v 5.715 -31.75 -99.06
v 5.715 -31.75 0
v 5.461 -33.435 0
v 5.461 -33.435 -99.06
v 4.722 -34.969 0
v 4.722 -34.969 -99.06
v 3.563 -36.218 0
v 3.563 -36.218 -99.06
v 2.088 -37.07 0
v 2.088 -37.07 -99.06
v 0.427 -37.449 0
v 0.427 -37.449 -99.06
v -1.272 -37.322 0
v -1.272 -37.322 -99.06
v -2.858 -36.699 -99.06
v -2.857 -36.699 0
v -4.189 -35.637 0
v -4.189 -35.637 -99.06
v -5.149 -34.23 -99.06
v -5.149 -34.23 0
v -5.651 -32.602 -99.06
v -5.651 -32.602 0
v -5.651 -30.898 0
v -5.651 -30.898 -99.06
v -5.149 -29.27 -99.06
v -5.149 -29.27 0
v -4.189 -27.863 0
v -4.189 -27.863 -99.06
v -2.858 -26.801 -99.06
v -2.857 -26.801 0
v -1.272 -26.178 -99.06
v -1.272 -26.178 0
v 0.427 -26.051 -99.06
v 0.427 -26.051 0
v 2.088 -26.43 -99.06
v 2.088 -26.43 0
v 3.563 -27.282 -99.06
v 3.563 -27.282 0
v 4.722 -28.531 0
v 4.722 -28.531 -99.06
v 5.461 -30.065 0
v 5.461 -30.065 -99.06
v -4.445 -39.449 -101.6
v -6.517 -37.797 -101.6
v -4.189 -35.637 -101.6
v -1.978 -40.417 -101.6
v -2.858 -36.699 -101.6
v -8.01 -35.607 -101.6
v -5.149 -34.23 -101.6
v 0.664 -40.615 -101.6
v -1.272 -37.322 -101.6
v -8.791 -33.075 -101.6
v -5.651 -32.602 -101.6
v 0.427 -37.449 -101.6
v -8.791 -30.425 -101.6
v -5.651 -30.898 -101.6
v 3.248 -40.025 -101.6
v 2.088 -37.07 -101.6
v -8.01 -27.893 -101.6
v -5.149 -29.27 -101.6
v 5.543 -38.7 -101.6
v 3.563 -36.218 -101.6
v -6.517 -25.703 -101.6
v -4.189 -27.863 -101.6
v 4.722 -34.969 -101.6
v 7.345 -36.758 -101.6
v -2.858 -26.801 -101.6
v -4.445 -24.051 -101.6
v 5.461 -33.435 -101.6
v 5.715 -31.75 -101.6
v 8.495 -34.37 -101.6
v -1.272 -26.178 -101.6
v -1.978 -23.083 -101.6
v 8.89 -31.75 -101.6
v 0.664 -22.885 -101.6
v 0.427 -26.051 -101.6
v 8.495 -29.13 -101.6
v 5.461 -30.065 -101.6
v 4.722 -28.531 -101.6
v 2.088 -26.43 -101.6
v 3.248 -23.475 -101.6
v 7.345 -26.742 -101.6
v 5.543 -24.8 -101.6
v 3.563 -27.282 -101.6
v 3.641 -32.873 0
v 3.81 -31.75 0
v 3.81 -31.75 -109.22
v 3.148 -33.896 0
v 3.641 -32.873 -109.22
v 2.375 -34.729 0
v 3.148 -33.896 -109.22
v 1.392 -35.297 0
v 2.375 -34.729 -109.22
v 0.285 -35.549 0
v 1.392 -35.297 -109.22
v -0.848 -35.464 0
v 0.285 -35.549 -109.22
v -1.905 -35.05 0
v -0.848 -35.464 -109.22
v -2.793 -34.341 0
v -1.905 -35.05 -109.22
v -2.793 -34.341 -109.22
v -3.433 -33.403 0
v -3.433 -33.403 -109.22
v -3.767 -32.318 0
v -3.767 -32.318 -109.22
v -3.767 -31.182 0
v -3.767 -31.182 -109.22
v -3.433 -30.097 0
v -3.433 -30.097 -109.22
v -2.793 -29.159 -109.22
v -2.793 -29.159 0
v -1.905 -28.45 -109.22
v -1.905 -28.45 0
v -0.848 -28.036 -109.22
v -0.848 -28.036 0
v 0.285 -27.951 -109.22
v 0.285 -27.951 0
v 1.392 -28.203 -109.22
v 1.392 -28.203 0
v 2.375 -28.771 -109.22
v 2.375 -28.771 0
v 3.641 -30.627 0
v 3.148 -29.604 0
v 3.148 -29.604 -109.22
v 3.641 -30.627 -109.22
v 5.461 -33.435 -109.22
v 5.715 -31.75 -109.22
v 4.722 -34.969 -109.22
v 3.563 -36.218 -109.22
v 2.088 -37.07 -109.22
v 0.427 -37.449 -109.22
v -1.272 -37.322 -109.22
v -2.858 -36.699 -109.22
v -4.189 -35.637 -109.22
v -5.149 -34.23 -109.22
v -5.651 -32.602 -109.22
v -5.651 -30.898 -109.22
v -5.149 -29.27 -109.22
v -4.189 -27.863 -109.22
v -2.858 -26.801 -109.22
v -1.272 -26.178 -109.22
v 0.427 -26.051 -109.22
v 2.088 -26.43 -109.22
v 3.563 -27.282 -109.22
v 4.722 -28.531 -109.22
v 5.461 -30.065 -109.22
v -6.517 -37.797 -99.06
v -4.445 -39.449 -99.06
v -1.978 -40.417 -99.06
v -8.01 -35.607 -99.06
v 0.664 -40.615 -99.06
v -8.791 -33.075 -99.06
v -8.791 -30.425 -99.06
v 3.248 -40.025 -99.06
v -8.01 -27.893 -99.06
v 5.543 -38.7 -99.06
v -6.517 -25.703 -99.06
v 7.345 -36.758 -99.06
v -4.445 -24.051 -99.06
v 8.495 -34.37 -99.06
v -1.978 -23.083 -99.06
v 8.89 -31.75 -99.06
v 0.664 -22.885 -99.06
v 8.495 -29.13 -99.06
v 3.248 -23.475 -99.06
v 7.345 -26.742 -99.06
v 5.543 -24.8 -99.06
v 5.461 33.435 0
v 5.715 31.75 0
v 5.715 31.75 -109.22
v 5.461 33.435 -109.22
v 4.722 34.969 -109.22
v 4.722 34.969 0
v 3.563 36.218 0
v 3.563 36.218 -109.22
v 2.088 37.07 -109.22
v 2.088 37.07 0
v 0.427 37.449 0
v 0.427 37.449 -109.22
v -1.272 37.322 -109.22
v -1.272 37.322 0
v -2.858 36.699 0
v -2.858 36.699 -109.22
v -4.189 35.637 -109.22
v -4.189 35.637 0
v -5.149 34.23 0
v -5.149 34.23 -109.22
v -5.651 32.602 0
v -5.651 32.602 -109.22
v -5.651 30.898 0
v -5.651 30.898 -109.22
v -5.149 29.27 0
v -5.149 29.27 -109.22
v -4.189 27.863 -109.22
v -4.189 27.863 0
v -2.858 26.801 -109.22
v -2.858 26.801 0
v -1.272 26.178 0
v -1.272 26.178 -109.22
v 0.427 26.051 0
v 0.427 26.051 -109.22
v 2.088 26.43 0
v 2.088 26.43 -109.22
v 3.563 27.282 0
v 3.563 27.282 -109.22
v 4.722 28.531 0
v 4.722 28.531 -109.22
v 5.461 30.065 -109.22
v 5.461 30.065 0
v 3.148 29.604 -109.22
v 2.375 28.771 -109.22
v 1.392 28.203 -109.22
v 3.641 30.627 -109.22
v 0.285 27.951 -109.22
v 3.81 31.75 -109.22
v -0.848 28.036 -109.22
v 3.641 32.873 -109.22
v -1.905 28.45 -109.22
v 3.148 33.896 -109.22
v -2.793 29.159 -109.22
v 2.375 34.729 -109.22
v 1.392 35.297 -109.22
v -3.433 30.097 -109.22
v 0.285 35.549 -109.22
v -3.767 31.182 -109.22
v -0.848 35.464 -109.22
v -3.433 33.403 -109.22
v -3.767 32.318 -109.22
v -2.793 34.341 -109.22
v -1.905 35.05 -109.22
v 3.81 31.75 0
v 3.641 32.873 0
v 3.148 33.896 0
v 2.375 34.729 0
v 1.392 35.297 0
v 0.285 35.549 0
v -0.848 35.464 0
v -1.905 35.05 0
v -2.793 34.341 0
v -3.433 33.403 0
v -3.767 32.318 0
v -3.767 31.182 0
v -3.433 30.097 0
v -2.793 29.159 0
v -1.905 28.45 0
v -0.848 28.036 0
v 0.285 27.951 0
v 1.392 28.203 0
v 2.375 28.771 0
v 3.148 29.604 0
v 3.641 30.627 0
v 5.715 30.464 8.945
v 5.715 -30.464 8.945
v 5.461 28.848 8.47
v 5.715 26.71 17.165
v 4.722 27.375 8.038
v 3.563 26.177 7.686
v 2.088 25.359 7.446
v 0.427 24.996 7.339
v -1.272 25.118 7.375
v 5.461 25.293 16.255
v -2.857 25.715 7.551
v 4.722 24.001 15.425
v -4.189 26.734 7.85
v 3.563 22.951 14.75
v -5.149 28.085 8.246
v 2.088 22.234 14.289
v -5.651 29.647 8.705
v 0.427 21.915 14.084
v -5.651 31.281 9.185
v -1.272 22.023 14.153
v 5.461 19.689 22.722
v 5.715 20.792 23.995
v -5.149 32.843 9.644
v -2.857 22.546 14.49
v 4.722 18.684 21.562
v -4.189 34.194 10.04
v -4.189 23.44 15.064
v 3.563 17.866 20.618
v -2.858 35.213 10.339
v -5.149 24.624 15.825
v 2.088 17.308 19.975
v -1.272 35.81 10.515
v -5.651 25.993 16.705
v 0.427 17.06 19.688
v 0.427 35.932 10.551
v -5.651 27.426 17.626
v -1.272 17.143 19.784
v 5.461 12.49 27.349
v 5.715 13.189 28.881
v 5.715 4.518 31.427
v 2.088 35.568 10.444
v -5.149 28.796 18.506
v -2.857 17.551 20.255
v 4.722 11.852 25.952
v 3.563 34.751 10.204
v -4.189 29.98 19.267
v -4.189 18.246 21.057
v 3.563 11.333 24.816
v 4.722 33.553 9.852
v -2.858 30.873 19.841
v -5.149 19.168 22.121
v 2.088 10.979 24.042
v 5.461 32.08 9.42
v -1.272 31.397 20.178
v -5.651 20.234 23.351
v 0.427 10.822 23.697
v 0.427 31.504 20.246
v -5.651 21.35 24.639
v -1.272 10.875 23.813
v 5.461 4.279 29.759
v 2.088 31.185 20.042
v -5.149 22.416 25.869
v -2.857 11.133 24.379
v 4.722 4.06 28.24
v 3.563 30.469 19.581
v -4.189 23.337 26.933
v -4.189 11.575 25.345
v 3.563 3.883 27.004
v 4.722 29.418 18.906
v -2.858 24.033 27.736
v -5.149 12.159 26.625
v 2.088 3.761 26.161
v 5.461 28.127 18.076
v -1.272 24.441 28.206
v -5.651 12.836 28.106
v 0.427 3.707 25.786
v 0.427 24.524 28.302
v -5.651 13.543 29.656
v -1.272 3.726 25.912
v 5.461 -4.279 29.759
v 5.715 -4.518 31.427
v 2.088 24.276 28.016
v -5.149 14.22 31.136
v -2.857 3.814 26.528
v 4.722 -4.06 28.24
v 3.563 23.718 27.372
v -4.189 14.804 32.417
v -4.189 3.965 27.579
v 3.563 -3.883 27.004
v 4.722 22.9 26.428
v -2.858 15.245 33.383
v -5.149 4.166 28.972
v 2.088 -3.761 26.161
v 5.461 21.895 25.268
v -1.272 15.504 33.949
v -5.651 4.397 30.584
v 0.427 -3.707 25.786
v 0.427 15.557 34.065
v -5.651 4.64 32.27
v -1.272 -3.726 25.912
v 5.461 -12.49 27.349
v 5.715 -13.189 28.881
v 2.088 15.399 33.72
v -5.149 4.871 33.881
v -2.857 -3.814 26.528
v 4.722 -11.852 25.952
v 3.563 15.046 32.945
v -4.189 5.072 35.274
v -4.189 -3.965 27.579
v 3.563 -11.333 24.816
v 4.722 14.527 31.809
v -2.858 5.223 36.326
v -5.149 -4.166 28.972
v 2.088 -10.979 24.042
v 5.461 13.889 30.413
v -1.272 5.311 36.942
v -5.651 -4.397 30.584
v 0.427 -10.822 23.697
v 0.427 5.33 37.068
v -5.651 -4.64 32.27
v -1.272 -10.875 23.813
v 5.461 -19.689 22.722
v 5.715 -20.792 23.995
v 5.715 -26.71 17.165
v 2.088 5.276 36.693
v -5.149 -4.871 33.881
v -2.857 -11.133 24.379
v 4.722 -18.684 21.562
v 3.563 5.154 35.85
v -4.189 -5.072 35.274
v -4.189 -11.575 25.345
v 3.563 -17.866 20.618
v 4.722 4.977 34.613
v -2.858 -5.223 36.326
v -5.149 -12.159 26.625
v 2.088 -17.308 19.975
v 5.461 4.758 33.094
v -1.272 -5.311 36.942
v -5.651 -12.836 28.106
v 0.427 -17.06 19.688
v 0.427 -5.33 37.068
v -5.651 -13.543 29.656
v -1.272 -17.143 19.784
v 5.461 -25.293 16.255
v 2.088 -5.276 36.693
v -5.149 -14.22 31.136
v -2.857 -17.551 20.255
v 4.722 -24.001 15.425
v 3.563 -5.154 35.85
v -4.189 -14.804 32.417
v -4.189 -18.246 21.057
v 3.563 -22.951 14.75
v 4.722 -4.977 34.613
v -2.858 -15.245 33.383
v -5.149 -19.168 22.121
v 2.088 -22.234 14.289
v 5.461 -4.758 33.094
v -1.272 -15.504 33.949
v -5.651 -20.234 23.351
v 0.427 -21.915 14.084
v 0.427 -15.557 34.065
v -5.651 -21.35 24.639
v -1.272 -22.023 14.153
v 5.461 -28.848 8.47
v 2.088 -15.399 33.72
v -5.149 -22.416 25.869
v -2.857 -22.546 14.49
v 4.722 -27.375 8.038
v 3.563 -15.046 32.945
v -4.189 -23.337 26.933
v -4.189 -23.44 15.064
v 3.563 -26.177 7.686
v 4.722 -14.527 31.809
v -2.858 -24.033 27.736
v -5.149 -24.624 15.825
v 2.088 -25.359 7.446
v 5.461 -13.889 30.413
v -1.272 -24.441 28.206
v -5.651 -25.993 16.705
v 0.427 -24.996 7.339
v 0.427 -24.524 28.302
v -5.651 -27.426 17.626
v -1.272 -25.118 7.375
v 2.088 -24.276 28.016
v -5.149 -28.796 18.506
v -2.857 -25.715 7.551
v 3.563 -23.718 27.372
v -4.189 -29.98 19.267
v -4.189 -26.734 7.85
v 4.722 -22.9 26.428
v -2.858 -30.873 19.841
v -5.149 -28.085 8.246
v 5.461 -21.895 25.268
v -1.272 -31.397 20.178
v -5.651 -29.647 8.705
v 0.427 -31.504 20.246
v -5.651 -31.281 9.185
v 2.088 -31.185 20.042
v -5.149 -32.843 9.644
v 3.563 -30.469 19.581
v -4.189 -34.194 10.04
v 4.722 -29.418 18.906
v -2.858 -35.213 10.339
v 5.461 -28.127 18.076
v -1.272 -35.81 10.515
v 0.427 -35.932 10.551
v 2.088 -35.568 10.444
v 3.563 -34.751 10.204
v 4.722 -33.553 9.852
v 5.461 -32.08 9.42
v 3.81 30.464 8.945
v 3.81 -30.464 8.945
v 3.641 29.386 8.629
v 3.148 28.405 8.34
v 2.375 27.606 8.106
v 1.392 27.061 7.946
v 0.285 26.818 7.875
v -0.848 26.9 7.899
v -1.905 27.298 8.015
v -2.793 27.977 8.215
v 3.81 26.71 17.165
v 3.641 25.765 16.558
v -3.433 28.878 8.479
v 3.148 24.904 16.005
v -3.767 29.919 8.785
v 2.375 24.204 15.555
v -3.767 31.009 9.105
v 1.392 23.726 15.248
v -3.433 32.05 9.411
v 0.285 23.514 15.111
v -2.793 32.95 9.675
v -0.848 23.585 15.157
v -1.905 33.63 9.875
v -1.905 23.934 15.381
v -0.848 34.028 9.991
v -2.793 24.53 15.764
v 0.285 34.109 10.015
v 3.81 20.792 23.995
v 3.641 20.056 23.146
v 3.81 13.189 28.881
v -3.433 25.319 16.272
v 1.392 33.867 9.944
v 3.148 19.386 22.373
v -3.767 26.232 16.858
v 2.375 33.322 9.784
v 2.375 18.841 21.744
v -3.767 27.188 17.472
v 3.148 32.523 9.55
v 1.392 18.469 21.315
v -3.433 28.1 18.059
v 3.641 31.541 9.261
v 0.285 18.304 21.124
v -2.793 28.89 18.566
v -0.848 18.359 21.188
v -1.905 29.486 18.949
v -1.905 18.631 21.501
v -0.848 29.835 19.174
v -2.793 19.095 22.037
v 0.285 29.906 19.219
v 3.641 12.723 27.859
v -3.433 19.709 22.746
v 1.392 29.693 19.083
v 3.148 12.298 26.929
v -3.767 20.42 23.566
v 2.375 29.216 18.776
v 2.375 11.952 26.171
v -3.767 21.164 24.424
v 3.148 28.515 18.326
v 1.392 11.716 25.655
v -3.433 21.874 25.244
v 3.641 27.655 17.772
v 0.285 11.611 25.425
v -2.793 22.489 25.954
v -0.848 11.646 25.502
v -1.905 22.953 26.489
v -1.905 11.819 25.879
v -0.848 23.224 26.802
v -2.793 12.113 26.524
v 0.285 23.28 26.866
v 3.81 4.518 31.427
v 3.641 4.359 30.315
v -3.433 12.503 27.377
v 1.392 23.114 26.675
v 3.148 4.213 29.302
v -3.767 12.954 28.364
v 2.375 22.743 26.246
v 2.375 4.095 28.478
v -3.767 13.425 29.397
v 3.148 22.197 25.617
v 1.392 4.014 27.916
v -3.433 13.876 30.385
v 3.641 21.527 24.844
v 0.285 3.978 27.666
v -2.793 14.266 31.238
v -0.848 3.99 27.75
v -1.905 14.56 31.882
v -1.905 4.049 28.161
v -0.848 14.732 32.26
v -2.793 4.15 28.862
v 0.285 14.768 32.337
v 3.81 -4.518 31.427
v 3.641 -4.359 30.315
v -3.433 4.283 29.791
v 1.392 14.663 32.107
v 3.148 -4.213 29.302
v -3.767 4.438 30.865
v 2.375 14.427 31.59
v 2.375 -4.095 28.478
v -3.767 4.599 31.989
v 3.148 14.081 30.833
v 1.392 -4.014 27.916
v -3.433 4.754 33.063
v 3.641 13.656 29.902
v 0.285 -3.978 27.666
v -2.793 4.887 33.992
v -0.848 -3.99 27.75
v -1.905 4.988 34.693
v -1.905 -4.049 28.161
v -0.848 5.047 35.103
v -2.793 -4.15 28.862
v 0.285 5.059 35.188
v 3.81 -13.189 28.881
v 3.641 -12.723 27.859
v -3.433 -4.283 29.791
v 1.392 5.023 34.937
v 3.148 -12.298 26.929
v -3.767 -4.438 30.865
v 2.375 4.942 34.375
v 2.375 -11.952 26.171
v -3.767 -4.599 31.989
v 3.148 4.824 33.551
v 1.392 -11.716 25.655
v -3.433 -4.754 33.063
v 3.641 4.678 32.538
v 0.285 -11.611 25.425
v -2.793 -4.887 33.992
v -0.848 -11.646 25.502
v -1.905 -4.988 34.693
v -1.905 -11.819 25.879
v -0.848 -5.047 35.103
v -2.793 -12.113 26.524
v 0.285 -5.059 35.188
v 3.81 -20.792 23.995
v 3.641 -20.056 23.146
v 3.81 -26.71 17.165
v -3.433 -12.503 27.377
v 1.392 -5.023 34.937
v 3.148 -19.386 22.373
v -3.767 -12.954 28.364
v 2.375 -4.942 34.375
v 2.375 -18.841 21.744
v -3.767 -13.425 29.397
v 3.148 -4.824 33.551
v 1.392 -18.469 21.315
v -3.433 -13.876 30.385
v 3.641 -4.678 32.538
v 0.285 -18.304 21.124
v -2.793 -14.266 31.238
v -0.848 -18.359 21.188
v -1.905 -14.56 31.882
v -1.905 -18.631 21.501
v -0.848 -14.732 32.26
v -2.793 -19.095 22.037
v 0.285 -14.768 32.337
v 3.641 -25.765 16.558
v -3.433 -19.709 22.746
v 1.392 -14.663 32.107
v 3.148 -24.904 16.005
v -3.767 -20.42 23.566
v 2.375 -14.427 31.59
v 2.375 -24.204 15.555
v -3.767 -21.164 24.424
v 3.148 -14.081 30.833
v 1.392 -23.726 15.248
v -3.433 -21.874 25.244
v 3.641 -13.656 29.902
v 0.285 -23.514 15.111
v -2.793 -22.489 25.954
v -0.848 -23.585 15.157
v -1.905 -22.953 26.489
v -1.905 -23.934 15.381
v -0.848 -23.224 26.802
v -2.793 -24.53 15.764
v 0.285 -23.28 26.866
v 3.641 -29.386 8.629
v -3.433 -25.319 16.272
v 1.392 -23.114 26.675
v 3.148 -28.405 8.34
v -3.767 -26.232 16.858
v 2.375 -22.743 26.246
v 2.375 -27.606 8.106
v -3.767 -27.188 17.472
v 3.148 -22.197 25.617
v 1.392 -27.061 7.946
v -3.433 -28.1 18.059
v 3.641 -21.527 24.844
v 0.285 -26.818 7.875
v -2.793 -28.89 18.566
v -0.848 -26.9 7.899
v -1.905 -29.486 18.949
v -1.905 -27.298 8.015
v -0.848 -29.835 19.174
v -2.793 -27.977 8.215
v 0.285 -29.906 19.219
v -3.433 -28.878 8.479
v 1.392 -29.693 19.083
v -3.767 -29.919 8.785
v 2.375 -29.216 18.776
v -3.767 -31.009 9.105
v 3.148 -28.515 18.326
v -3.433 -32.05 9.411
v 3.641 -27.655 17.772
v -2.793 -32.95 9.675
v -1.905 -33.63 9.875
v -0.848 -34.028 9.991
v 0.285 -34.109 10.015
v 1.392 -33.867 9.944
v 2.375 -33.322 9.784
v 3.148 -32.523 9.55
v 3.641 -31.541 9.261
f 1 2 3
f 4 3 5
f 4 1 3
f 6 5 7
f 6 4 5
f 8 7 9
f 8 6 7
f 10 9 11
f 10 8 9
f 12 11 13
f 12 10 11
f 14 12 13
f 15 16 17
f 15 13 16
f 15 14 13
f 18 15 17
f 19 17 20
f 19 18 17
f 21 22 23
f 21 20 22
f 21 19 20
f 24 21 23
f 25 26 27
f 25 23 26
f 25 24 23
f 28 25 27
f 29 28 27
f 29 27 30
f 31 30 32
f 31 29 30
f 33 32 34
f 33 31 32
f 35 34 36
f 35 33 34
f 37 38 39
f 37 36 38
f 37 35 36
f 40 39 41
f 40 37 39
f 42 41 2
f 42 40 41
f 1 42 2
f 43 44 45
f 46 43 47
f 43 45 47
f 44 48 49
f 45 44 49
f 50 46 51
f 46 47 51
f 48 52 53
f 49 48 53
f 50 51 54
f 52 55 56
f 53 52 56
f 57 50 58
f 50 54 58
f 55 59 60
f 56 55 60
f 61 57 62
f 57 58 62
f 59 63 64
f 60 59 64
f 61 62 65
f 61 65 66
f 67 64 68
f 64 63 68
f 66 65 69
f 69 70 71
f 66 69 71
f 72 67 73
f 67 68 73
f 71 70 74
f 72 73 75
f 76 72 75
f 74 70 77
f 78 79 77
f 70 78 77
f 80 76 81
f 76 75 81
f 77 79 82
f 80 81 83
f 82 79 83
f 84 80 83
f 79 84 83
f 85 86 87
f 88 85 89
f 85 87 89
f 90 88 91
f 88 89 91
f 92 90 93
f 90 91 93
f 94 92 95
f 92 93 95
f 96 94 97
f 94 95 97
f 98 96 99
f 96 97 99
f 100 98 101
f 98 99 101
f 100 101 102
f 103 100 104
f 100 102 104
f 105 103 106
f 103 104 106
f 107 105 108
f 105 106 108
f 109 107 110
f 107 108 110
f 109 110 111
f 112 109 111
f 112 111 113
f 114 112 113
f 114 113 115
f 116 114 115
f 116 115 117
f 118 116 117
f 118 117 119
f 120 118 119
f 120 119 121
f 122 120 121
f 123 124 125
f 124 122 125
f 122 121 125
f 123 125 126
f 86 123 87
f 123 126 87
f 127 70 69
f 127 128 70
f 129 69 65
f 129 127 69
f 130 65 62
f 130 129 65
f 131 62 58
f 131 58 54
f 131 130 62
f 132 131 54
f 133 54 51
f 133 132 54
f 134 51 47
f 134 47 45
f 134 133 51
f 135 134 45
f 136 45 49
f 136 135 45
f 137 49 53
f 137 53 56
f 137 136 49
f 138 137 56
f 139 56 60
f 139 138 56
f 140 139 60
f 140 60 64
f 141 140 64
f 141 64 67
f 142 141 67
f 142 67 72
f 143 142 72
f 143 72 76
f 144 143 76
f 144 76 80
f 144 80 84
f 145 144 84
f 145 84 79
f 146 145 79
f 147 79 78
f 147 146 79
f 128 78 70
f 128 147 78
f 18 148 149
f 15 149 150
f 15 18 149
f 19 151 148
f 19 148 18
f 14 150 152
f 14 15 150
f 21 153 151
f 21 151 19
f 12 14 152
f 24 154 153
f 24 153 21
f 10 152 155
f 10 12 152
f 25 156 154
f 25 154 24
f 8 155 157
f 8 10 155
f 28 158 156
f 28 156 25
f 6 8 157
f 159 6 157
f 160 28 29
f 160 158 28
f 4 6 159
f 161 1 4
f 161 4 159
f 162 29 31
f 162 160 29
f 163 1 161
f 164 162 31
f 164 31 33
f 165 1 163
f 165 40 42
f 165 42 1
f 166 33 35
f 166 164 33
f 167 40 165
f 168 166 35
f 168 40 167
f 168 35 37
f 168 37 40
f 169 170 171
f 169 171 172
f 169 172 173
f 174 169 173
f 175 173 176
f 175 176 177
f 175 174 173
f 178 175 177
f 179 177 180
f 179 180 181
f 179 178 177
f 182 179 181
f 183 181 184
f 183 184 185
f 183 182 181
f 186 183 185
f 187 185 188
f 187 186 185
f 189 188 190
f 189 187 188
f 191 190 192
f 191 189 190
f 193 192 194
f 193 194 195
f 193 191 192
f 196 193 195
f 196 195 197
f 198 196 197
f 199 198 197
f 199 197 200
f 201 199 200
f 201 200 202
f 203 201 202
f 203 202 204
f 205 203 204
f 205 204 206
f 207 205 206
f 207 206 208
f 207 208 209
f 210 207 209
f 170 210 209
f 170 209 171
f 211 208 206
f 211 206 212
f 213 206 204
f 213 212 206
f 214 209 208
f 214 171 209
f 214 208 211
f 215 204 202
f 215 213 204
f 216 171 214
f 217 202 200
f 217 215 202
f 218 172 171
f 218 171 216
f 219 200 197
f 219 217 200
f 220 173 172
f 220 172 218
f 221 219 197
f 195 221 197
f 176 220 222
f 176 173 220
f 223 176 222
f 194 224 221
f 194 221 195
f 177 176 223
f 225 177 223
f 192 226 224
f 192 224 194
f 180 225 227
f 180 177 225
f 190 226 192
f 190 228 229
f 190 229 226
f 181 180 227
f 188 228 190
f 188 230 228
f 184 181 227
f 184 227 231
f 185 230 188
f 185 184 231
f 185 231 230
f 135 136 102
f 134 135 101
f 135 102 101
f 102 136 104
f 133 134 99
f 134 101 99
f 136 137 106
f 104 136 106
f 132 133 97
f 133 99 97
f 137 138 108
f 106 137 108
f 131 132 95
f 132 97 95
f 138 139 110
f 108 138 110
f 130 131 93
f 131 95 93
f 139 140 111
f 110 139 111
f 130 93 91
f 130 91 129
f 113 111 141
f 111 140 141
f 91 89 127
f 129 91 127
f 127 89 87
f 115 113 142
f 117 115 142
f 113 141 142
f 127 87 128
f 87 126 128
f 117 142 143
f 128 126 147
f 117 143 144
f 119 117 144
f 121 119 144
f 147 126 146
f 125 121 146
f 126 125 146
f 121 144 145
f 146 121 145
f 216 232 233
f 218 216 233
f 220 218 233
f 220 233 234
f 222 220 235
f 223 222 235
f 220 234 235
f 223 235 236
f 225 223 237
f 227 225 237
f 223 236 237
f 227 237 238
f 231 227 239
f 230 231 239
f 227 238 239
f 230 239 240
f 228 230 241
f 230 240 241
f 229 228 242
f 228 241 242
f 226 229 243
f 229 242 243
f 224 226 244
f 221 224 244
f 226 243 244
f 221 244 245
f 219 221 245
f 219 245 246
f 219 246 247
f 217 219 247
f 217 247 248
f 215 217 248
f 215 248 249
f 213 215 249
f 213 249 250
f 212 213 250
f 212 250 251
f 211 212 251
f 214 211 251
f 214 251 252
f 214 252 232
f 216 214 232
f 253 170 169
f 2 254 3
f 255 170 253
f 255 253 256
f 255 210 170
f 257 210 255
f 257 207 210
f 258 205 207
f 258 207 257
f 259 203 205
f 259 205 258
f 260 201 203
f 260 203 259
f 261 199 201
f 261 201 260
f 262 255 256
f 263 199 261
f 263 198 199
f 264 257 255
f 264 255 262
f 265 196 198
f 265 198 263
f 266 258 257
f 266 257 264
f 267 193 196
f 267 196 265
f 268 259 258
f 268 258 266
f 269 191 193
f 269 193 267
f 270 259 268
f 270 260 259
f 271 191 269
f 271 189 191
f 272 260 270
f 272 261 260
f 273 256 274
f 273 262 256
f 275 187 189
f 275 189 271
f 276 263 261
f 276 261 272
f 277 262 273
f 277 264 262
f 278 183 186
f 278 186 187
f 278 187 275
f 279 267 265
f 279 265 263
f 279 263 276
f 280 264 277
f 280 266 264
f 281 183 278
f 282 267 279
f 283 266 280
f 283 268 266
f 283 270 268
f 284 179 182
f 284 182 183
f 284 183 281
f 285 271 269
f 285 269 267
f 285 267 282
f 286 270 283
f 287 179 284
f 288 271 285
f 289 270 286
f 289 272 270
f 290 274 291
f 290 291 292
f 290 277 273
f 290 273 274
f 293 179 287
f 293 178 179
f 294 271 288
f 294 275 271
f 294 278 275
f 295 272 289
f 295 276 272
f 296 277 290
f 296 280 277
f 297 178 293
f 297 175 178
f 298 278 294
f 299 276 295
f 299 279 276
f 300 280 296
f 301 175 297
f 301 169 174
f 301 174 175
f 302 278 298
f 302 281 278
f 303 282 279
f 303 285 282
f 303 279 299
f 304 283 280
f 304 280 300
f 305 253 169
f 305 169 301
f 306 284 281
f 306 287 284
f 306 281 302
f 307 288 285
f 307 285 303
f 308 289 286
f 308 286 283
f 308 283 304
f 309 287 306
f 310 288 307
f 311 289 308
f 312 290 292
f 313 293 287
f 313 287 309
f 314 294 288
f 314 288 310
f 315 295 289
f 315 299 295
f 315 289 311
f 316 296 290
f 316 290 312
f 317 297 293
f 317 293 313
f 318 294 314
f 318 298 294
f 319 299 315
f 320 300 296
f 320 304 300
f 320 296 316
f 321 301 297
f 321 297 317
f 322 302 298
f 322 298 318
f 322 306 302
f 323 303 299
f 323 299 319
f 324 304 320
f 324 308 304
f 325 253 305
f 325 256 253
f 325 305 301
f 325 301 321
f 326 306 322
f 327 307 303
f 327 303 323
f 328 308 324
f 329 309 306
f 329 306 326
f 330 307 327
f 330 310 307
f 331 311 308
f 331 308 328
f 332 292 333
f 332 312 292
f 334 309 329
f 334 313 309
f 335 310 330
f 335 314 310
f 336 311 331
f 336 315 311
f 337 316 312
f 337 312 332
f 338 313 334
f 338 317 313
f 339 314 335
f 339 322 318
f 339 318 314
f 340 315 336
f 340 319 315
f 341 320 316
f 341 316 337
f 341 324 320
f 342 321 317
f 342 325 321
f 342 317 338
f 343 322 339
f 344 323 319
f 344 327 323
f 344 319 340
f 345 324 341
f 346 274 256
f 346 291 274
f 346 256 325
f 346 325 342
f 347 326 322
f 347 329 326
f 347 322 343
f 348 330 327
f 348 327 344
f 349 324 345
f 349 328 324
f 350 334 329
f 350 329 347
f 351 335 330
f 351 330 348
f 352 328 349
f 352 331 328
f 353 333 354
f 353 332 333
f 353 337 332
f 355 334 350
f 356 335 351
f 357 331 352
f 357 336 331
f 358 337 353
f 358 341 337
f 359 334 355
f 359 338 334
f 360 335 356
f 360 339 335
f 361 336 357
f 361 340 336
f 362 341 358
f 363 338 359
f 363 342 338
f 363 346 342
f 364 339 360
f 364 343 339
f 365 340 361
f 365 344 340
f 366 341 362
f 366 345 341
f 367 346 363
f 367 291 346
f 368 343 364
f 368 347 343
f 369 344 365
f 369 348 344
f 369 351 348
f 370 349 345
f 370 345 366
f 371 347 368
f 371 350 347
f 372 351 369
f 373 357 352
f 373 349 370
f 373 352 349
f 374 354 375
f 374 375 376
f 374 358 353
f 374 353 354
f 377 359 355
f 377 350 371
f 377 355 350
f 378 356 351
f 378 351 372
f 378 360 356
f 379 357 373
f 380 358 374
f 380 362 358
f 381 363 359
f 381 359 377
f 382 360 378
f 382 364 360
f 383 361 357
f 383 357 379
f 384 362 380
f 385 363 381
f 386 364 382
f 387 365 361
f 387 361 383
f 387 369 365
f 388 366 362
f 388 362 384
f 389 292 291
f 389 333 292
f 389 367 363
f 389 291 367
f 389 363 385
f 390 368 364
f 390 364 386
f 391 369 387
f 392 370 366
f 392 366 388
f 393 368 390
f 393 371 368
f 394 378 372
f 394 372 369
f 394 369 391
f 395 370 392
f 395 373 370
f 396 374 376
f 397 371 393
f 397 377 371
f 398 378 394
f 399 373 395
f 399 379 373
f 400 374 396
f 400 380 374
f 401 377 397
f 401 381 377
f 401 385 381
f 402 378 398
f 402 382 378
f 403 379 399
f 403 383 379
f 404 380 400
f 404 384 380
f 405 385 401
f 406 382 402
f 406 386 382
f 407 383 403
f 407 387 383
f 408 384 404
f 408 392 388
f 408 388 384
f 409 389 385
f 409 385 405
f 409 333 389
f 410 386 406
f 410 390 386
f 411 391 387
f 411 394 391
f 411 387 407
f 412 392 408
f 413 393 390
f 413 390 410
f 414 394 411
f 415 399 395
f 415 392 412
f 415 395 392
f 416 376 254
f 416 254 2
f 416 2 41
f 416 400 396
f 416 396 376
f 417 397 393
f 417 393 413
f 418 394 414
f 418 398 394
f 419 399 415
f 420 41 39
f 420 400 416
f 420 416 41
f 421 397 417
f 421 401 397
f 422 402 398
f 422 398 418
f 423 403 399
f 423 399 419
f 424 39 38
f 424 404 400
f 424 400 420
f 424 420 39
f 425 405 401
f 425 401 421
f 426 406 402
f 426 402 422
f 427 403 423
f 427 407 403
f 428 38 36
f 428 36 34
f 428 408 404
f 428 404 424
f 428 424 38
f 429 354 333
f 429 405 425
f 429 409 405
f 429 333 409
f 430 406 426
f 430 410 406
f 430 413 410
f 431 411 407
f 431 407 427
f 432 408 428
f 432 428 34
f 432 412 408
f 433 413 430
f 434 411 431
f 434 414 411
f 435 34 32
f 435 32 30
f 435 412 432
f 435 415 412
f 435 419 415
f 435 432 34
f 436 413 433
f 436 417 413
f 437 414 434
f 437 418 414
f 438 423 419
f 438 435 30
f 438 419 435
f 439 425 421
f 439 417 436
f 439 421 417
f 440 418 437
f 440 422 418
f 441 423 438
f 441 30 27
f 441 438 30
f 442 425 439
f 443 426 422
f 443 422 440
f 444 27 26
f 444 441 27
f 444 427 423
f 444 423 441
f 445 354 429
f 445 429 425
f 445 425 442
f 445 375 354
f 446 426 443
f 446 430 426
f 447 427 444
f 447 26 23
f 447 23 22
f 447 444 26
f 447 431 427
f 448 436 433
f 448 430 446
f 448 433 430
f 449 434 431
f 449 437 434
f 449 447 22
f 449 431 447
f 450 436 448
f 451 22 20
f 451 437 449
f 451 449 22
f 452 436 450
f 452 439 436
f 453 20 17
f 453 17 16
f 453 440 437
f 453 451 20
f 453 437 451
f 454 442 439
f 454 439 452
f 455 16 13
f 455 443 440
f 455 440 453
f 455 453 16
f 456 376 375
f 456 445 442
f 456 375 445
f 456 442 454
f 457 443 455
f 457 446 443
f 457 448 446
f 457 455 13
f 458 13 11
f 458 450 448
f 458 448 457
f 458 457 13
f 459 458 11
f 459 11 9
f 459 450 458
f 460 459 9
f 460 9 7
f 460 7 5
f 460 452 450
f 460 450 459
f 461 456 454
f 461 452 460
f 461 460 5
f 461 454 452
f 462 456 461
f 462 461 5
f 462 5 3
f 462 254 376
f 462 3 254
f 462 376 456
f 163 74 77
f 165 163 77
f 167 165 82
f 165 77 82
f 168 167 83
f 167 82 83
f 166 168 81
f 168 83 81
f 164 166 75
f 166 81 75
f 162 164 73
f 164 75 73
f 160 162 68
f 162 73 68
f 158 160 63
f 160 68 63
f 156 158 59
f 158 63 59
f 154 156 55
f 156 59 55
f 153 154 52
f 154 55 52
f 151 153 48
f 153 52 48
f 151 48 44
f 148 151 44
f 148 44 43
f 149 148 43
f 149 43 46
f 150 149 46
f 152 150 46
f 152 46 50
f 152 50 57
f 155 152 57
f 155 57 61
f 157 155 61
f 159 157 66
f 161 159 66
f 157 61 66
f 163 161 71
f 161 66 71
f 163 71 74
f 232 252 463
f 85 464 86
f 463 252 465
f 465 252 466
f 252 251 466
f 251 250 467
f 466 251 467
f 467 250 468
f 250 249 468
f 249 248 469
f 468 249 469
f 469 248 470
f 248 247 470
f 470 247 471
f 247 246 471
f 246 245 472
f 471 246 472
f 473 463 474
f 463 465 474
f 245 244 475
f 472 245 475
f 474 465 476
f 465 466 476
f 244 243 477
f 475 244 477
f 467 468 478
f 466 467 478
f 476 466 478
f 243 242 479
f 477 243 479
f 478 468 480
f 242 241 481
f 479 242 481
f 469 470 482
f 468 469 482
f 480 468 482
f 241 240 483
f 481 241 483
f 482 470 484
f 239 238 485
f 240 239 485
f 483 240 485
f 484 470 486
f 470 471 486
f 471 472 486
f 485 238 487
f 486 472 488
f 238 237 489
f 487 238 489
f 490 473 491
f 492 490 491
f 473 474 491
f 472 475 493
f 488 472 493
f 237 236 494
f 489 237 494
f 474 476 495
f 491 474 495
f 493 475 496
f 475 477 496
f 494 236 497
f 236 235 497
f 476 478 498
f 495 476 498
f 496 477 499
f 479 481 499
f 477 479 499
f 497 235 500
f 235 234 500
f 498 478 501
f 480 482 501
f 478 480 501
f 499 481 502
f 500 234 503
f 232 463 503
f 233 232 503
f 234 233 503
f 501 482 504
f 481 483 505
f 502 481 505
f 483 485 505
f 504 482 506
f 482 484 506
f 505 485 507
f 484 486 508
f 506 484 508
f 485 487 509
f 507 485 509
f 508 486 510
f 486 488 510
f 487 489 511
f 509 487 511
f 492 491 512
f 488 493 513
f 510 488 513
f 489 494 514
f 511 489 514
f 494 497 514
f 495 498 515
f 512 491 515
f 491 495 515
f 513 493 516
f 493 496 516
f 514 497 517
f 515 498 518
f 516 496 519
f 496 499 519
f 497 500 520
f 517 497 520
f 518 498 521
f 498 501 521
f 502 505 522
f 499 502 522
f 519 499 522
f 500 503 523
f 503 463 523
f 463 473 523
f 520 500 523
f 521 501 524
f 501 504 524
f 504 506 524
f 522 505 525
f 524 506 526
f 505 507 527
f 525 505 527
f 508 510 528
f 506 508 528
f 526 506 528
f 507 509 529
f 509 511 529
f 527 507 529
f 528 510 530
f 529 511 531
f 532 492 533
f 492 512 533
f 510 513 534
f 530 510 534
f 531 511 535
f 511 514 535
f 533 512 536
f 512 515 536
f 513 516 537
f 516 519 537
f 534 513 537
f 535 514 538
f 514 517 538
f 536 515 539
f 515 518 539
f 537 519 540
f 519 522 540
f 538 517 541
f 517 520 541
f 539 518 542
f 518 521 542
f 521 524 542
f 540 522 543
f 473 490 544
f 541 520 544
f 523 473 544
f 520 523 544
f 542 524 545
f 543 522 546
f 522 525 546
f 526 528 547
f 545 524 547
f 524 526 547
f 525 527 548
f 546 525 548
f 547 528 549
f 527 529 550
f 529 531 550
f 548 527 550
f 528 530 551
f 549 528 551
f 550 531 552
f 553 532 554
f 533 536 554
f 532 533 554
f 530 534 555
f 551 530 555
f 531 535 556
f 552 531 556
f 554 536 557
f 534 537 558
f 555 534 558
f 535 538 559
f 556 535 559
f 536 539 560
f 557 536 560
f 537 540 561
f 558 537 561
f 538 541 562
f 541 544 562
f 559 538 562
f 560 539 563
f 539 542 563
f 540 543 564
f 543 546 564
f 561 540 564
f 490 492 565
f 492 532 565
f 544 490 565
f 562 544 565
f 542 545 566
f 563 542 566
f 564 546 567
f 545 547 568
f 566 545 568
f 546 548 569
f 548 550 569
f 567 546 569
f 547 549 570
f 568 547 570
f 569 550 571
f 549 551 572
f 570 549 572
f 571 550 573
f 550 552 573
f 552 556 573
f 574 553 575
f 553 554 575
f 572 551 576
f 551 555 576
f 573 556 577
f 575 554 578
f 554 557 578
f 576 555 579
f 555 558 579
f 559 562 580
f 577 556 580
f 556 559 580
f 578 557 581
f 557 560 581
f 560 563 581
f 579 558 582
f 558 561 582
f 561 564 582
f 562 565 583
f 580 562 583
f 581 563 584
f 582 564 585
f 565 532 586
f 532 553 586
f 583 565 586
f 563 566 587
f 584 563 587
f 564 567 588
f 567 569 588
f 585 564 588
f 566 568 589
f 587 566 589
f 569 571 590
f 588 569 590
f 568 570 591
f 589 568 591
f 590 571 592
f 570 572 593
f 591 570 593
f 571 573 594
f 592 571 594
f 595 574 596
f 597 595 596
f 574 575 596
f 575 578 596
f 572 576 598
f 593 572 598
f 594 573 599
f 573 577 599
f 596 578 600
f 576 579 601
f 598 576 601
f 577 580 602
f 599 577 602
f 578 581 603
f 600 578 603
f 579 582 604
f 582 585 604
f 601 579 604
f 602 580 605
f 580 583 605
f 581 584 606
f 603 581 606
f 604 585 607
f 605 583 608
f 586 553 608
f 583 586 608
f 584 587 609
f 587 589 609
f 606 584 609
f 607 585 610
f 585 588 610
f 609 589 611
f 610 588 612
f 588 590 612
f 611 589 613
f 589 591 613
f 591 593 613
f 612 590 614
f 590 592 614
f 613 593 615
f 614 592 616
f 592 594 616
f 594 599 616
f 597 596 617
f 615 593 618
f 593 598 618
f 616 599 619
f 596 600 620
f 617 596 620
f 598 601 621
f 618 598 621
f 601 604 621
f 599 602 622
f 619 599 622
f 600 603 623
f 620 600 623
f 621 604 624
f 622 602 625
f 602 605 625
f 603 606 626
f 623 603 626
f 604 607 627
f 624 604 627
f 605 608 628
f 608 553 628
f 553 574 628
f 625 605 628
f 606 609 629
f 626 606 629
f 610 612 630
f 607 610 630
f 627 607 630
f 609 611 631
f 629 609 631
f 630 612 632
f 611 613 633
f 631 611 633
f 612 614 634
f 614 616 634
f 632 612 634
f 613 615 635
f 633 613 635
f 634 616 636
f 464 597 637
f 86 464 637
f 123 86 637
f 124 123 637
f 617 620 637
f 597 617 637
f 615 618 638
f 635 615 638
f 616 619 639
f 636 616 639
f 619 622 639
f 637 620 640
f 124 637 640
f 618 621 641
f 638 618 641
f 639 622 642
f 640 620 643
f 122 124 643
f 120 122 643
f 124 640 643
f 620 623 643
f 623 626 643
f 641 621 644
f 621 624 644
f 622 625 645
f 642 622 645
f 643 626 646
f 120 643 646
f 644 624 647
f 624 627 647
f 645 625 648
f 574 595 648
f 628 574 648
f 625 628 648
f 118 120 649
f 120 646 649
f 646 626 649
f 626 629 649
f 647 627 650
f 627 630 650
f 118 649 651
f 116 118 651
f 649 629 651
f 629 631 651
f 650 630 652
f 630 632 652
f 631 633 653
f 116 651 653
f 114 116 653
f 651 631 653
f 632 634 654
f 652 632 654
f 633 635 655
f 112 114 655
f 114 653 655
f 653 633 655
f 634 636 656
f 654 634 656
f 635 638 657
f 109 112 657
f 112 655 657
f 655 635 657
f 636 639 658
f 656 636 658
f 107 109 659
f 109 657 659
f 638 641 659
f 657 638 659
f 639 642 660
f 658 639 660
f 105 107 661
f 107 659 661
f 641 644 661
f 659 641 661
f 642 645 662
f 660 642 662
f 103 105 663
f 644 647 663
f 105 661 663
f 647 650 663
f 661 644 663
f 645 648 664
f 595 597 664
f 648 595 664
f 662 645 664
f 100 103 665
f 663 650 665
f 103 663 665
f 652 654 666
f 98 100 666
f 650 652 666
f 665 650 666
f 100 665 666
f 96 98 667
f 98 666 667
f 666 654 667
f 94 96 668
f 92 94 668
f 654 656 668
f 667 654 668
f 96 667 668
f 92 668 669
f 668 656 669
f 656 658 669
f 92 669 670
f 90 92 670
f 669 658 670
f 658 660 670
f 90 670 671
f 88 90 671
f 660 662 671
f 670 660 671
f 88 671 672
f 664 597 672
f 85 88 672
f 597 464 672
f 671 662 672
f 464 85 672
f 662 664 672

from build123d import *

# Parameters (mm, degrees)
F1_R     = 5.715
F1_R_2   = 3.81
F4_R     = 8.89
F4_R_2   = 4.360362463
F5_DEPTH = 2.54


with BuildPart() as f2:
    # F2: sweep along a path in F0
    with BuildLine(Plane.YZ) as f2_path:
        Line((31.75, -109.22), (31.75, 0))
        ThreePointArc((31.75, 0), (0, 31.75), (-31.75, 0))
        Line((-31.75, 0), (-31.75, -109.22))
    # F1 (on Top) → F2 (sweep)
    with BuildSketch(Plane.XY):
        with Locations((0, -31.75)):
            Circle(F1_R)
        with Locations((0, -31.75)):
            Circle(F1_R_2, mode=Mode.SUBTRACT)
    sweep(path=f2_path.line)

    # F4 (on offset) → F5 (join)
    with BuildSketch(Plane.XY.offset(-101.6)):
        with Locations((0, -31.75)):
            Circle(F4_R)
        with Locations((0, -31.75)):
            Circle(F4_R_2, mode=Mode.SUBTRACT)
    extrude(amount=F5_DEPTH)


solid = f2.part
